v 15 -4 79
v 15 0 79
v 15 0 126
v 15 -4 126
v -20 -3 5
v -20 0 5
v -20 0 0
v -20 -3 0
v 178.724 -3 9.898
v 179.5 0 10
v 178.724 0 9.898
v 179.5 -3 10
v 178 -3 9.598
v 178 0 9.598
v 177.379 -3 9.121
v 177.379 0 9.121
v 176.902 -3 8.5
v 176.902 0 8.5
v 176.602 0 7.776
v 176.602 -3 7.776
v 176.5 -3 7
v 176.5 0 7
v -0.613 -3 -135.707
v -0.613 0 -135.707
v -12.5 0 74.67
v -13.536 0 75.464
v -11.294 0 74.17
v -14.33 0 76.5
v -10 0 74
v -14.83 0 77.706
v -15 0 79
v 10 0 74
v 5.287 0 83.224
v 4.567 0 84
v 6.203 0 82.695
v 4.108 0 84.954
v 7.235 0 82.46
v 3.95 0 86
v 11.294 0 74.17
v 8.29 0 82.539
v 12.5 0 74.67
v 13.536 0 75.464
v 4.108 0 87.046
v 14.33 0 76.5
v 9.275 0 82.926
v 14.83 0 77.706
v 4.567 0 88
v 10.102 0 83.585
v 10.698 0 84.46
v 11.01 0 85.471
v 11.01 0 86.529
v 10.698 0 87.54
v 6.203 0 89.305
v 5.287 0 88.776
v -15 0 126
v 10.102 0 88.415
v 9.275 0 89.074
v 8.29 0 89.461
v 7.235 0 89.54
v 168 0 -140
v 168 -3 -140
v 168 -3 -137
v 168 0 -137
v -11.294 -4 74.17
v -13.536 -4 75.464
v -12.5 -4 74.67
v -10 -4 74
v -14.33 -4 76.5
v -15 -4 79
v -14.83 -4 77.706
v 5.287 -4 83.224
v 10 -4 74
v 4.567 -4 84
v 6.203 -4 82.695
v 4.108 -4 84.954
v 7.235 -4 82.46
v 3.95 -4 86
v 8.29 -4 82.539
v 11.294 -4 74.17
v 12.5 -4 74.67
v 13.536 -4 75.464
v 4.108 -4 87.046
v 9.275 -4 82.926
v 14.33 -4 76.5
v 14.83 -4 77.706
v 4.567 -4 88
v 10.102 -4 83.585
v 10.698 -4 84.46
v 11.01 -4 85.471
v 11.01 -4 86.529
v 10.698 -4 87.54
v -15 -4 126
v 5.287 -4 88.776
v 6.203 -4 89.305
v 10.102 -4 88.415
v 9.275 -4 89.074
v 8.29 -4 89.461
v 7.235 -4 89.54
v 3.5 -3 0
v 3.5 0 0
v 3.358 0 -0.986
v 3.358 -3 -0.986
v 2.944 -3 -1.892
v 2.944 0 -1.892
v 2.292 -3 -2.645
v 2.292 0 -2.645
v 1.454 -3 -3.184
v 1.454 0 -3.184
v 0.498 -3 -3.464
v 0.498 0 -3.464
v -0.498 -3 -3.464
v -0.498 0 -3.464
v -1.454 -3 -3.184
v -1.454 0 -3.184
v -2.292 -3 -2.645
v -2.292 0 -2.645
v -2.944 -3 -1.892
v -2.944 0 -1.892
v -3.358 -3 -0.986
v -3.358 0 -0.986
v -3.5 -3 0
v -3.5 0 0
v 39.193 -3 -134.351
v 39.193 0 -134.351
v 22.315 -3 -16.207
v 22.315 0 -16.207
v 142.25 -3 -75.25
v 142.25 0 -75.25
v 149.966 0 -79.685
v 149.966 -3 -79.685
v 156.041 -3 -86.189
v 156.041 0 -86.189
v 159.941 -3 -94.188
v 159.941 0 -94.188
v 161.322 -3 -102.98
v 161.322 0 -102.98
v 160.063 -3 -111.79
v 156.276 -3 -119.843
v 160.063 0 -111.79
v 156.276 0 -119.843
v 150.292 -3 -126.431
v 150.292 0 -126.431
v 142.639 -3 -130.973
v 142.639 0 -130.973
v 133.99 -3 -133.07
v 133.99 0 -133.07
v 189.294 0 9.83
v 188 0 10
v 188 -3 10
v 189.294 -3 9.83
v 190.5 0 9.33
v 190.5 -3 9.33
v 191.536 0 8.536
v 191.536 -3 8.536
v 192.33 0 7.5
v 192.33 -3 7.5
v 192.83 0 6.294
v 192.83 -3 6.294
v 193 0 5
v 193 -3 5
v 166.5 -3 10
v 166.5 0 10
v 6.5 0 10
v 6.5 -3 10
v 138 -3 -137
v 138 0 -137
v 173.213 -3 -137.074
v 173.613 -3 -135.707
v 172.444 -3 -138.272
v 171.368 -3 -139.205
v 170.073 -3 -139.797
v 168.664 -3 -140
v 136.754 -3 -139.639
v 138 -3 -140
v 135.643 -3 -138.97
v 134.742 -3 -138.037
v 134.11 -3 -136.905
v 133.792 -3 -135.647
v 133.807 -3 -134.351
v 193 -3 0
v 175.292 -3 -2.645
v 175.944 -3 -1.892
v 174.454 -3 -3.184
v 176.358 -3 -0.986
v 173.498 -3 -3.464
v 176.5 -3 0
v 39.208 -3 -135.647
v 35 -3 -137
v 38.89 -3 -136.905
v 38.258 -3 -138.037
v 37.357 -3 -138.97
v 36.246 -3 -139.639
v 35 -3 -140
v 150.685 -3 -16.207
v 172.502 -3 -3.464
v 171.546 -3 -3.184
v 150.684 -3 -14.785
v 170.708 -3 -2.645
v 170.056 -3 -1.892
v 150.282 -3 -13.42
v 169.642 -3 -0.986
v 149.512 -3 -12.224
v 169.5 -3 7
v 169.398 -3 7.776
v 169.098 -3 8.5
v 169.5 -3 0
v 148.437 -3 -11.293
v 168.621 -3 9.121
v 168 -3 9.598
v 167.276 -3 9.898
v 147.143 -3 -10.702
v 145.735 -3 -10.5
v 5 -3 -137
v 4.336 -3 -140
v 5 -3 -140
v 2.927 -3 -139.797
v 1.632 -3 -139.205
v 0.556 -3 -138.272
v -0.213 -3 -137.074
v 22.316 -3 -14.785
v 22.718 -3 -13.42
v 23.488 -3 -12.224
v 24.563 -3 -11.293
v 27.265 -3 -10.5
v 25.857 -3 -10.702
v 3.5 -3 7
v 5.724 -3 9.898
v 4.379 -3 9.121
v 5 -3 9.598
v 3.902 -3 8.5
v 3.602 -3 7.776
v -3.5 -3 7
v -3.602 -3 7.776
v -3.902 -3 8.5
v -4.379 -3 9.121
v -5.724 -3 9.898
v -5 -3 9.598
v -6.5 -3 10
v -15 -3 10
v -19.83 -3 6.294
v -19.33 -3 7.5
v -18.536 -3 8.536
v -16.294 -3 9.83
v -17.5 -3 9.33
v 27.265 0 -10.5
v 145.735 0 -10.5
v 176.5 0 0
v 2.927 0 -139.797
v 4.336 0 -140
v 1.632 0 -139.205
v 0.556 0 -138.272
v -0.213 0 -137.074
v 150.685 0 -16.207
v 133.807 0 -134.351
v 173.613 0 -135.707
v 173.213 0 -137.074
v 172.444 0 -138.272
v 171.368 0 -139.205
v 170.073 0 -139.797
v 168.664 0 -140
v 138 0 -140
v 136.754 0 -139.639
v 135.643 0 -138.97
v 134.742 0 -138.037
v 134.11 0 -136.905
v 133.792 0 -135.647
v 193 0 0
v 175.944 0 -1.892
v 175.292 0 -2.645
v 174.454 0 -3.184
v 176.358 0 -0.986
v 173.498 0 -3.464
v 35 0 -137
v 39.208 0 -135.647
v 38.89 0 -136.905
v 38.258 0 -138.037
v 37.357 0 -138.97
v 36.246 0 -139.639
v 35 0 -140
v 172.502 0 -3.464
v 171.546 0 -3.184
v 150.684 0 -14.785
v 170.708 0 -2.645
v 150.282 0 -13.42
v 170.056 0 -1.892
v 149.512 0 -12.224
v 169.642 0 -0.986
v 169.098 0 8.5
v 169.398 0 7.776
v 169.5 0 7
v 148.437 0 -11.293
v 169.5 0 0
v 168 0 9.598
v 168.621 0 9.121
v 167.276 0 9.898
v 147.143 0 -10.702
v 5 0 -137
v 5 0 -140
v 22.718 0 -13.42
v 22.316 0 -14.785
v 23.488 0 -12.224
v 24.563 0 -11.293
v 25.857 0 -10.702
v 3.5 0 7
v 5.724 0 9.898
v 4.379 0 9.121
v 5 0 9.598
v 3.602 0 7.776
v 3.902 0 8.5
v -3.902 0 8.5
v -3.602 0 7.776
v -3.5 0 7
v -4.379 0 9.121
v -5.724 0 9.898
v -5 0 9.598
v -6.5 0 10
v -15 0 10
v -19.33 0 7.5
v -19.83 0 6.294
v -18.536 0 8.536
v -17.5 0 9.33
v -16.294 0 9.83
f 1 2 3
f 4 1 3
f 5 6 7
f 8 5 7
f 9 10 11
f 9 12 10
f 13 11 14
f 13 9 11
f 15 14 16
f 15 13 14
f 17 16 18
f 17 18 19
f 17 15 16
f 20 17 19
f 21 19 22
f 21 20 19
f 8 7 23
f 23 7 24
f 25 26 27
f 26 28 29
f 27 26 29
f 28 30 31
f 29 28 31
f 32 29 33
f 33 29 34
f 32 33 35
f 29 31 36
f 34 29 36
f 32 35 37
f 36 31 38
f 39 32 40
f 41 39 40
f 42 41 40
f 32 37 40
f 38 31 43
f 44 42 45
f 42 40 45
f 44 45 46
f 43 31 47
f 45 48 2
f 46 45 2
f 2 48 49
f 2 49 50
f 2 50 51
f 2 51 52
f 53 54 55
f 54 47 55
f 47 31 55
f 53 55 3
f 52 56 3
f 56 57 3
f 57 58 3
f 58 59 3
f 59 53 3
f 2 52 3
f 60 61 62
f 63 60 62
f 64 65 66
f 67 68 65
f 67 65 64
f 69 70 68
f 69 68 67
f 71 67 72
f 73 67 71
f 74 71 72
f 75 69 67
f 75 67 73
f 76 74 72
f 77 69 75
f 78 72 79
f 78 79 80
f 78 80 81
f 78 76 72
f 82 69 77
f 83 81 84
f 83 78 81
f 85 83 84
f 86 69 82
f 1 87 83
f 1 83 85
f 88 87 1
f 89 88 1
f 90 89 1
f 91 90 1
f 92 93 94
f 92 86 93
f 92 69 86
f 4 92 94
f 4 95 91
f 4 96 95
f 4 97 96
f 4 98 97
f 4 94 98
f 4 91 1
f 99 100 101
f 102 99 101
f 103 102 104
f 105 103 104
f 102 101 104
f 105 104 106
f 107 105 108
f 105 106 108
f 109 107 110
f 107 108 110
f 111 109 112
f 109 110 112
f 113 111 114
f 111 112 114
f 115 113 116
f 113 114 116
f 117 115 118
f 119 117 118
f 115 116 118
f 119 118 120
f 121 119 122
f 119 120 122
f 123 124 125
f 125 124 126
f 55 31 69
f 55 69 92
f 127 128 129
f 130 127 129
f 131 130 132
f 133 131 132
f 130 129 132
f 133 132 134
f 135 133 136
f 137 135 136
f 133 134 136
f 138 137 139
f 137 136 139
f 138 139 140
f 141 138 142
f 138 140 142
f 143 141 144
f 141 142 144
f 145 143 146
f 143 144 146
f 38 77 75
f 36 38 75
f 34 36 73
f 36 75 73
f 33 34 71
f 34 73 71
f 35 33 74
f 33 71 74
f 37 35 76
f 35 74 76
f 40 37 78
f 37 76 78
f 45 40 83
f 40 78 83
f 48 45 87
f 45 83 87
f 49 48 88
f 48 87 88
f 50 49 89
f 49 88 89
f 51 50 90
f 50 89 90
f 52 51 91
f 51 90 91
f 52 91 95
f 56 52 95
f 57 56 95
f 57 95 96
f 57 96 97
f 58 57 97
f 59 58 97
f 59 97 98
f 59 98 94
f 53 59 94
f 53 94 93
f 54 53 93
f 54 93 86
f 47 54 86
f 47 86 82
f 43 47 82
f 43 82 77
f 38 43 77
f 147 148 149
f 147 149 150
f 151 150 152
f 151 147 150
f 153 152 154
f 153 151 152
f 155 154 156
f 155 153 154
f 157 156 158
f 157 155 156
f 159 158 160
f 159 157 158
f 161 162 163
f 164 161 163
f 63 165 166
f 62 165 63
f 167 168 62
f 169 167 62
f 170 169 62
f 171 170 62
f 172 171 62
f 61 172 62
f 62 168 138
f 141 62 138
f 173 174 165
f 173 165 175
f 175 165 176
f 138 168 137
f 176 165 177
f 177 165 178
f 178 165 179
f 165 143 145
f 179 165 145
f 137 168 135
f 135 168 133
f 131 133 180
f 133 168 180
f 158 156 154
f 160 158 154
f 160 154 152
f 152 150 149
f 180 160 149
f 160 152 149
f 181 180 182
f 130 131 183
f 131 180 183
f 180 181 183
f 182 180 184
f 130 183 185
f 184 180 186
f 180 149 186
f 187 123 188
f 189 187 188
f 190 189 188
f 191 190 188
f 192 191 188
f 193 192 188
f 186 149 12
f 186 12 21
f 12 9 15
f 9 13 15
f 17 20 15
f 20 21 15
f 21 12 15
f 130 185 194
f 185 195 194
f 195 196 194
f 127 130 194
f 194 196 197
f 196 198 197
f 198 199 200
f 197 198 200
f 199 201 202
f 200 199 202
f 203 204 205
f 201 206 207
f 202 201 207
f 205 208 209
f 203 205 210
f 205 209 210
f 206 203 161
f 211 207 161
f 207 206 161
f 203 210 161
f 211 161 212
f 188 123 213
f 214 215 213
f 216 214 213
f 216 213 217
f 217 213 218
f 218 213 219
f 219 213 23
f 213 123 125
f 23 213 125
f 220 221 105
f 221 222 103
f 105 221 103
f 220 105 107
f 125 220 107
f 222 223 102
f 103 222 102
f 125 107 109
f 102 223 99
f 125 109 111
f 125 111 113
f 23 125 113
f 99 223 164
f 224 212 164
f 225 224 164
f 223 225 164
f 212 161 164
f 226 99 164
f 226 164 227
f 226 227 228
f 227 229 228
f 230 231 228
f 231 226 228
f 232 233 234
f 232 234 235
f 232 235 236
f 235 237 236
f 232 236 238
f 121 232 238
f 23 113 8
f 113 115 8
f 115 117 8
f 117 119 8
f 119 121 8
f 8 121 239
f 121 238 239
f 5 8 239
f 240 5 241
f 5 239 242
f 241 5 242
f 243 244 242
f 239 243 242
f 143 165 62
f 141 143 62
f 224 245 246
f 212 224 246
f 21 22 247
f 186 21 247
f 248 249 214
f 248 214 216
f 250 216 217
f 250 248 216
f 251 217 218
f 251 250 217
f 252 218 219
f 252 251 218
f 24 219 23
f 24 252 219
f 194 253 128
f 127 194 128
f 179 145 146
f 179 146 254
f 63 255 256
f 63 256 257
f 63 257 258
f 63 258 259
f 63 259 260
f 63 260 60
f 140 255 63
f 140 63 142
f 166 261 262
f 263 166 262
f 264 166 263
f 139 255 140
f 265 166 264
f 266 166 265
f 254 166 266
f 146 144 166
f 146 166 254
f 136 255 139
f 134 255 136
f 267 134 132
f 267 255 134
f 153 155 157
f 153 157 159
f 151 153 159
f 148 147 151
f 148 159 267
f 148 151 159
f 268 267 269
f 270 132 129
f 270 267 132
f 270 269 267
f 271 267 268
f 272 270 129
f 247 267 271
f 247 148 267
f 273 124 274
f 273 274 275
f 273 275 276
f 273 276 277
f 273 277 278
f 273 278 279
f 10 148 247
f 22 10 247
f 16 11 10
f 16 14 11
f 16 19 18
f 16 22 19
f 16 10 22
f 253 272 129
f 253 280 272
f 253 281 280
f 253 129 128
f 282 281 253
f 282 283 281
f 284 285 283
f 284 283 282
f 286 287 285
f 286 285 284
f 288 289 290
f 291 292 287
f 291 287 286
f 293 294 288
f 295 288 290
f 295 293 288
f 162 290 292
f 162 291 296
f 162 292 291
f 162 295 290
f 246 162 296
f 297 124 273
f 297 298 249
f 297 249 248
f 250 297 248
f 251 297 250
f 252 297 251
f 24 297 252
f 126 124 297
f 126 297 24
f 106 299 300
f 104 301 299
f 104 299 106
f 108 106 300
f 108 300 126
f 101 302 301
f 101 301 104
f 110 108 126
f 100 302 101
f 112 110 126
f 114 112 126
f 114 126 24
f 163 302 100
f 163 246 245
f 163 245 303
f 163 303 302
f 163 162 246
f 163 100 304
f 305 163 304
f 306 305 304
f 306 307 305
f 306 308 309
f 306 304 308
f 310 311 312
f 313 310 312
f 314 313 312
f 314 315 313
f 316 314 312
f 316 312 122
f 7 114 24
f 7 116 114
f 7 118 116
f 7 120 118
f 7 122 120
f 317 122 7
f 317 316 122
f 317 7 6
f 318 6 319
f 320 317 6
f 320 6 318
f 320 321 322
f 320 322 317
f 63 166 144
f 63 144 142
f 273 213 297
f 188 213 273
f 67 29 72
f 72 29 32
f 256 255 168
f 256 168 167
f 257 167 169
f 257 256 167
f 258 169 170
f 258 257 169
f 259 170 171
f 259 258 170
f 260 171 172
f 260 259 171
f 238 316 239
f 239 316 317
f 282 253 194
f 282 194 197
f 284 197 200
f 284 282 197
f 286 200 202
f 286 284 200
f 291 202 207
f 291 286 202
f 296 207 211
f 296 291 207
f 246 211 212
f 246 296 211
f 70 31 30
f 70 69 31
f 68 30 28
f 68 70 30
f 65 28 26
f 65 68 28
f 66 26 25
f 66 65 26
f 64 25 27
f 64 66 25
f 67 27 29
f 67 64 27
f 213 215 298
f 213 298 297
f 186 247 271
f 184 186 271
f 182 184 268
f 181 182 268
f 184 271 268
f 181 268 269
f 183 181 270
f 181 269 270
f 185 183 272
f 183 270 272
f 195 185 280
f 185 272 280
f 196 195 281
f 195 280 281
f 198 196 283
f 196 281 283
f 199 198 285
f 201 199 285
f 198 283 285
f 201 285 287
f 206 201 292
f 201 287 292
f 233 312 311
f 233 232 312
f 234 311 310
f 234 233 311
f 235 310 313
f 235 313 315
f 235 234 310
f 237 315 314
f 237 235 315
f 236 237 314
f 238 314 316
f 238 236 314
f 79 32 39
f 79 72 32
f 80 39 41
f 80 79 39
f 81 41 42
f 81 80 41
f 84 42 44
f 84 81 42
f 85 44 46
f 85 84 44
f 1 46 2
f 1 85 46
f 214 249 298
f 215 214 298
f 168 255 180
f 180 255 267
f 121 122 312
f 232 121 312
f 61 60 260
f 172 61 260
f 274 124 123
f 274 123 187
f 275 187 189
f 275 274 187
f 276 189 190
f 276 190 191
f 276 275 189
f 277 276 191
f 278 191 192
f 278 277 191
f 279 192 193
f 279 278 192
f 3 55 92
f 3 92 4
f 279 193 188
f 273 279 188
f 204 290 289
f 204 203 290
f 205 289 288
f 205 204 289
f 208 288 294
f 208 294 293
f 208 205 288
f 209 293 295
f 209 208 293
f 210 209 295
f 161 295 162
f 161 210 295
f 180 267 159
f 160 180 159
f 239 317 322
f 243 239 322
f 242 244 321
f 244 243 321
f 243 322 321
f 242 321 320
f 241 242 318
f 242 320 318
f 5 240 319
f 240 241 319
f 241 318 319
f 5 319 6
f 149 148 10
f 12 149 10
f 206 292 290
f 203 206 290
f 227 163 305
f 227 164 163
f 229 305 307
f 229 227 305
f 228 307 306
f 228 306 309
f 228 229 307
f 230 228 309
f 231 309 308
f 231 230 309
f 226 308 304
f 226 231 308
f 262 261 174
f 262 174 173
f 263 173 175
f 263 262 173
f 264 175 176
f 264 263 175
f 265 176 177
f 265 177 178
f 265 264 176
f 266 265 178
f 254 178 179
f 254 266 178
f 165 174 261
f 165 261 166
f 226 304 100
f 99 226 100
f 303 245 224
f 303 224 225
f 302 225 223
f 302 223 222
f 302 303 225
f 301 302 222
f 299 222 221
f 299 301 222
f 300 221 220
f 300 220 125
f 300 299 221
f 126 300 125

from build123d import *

# Parameters (mm, degrees)
F1_DEPTH     = 3
F2_W         = 30
F2_H         = 3
F3_DEPTH     = 25
F4_W         = 30
F4_H         = 52
F5_DEPTH     = 4
F6_D         = 7.1
F7_T1_DEPTH  = 3
F7_T3_DEPTH  = 3
F7_T5_DEPTH  = 28
F7_T7_DEPTH  = 28
F7_T9_DEPTH  = 24.6823850424
F7_T11_DEPTH = 31.5342712156
F7_T13_DEPTH = 31.5342712156
F7_T15_DEPTH = 24.6823850424
F8_R         = 3
F9_R         = 5


# Not quite as in the source:
# - a fillet or chamfer that OpenCascade refuses, or shapes differently, is made with other operations: its cross-section is extruded or revolved along the edge and cut away or added


with BuildPart() as f1:
    # F0 (on Front) → F1 (new body)
    with BuildSketch(Plane.XZ):
        with BuildLine():
            Line((-20, 10), (-20, 0))
            Line((-20, 0), (0, -140))
            Line((0, -140), (40, -140))
            Line((40, -140), (21.5, -10.5))
            Line((21.5, -10.5), (151.5, -10.5))
            Line((151.5, -10.5), (142.25, -75.25))
            ThreePointArc((142.25, -75.25), (161.0212778612, -107.4317915028), (133.9899494937, -133.0703535444))
            Line((133.9899494937, -133.0703535444), (133, -140))
            Line((133, -140), (173, -140))
            Line((173, -140), (193, 0))
            Line((193, 0), (193, 10))
            Line((193, 10), (176.5, 10))
            Line((176.5, 10), (176.5, 0))
            ThreePointArc((176.5, 0), (173, -3.5), (169.5, 0))
            Line((169.5, 0), (169.5, 10))
            Line((169.5, 10), (153, 10))
            Line((153, 10), (20, 10))
            Line((20, 10), (3.5, 10))
            Line((3.5, 10), (3.5, 0))
            ThreePointArc((3.5, 0), (0, -3.5), (-3.5, 0))
            Line((-3.5, 0), (-3.5, 10))
            Line((-3.5, 10), (-20, 10))
        make_face()
    extrude(amount=F1_DEPTH)

    # F2 (on face) → F3 (cut)
    with BuildSketch(Plane.XZ.offset(3)):
        with Locations((20, -138.5)):
            Rectangle(F2_W, F2_H)
        with Locations((153, -138.5)):
            Rectangle(F2_W, F2_H)
    extrude(amount=-F3_DEPTH, mode=Mode.SUBTRACT)

    # F7: fillet of radius 5 on 8 edges, made by hand

    # F7_s2 → F7_t1 (join)
    with BuildSketch(Plane.XZ):
        with BuildLine():
            ThreePointArc((150.6846990313, -16.2071067812), (149.5122213379, -12.2239912932), (145.734951563, -10.5))
            Line((145.734951563, -10.5), (151.5, -10.5))
            Line((151.5, -10.5), (150.6846990313, -16.2071067812))
        make_face()
    extrude(amount=F7_T1_DEPTH)

    # F7_s4 → F7_t3 (join)
    with BuildSketch(Plane.XZ):
        with BuildLine():
            ThreePointArc((27.265048437, -10.5), (23.4877786621, -12.2239912932), (22.3153009687, -16.2071067812))
            Line((22.3153009687, -16.2071067812), (21.5, -10.5))
            Line((21.5, -10.5), (27.265048437, -10.5))
        make_face()
    extrude(amount=F7_T3_DEPTH)

    # F7_s6 → F7_t5 (cut)
    with BuildSketch(Plane.XZ.offset(-12.5)):
        with BuildLine():
            ThreePointArc((-15, 10), (-18.5355339059, 8.5355339059), (-20, 5))
            Line((-20, 5), (-20, 10))
            Line((-20, 10), (-15, 10))
        make_face()
    extrude(amount=F7_T5_DEPTH, mode=Mode.SUBTRACT)

    # F7_s8 → F7_t7 (cut)
    with BuildSketch(Plane.XZ.offset(-12.5)):
        with BuildLine():
            ThreePointArc((188, 10), (191.5355339059, 8.5355339059), (193, 5))
            Line((193, 5), (193, 10))
            Line((193, 10), (188, 10))
        make_face()
    extrude(amount=F7_T7_DEPTH, mode=Mode.SUBTRACT)

    # F7_s10 → F7_t9 (cut)
    with BuildSketch(Plane.XZ.offset(-10.8411925212)):
        with BuildLine():
            ThreePointArc((173.6132704598, -135.7071067812), (171.9395316983, -138.777269775), (168.6635229915, -140))
            Line((168.6635229915, -140), (173, -140))
            Line((173, -140), (173.6132704598, -135.7071067812))
        make_face()
    extrude(amount=F7_T9_DEPTH, mode=Mode.SUBTRACT)

    # F7_s12 → F7_t11 (cut)
    with BuildSketch(Plane.XZ.offset(-14.2671356078)):
        with BuildLine():
            ThreePointArc((138, -140), (134.7417930933, -138.0374701654), (133.8070710669, -134.3505025316))
            Line((133.8070710669, -134.3505025316), (133, -140))
            Line((133, -140), (138, -140))
        make_face()
    extrude(amount=F7_T11_DEPTH, mode=Mode.SUBTRACT)

    # F7_s14 → F7_t13 (cut)
    with BuildSketch(Plane.XZ.offset(-14.2671356078)):
        with BuildLine():
            ThreePointArc((39.1929289331, -134.3505025316), (38.2582069067, -138.0374701654), (35, -140))
            Line((35, -140), (40, -140))
            Line((40, -140), (39.1929289331, -134.3505025316))
        make_face()
    extrude(amount=F7_T13_DEPTH, mode=Mode.SUBTRACT)

    # F7_s16 → F7_t15 (cut)
    with BuildSketch(Plane.XZ.offset(-10.8411925212)):
        with BuildLine():
            ThreePointArc((4.3364770085, -140), (1.0604683017, -138.777269775), (-0.6132704598, -135.7071067812))
            Line((-0.6132704598, -135.7071067812), (0, -140))
            Line((0, -140), (4.3364770085, -140))
        make_face()
    extrude(amount=F7_T15_DEPTH, mode=Mode.SUBTRACT)

    # F8
    f8_edges = [f1.edges().sort_by_distance(p)[0] for p in [
        (169.5, -1.5, 10),
        (176.5, -1.5, 10),
        (-3.5, -1.5, 10),
        (3.5, -1.5, 10),
    ]]
    fillet(f8_edges, radius=F8_R)


with BuildPart() as f5:
    # F4 (on Front) → F5 (new body)
    with BuildSketch(Plane.XZ):
        with Locations((0, 100)):
            Rectangle(F4_W, F4_H)
    extrude(amount=F5_DEPTH)

    # F6 (through all)
    with Locations(Plane(origin=(0, 0, 0), x_dir=(1, 0, 0), z_dir=(0, 1, 0))):
        with Locations((7.5, -86)):
            Hole(F6_D / 2)

    # F9
    f9_edges = [f5.edges().sort_by_distance(p)[0] for p in [
        (-15, -2, 74),
        (15, -2, 74),
    ]]
    fillet(f9_edges, radius=F9_R)


solid = Compound([f1.part, f5.part])
